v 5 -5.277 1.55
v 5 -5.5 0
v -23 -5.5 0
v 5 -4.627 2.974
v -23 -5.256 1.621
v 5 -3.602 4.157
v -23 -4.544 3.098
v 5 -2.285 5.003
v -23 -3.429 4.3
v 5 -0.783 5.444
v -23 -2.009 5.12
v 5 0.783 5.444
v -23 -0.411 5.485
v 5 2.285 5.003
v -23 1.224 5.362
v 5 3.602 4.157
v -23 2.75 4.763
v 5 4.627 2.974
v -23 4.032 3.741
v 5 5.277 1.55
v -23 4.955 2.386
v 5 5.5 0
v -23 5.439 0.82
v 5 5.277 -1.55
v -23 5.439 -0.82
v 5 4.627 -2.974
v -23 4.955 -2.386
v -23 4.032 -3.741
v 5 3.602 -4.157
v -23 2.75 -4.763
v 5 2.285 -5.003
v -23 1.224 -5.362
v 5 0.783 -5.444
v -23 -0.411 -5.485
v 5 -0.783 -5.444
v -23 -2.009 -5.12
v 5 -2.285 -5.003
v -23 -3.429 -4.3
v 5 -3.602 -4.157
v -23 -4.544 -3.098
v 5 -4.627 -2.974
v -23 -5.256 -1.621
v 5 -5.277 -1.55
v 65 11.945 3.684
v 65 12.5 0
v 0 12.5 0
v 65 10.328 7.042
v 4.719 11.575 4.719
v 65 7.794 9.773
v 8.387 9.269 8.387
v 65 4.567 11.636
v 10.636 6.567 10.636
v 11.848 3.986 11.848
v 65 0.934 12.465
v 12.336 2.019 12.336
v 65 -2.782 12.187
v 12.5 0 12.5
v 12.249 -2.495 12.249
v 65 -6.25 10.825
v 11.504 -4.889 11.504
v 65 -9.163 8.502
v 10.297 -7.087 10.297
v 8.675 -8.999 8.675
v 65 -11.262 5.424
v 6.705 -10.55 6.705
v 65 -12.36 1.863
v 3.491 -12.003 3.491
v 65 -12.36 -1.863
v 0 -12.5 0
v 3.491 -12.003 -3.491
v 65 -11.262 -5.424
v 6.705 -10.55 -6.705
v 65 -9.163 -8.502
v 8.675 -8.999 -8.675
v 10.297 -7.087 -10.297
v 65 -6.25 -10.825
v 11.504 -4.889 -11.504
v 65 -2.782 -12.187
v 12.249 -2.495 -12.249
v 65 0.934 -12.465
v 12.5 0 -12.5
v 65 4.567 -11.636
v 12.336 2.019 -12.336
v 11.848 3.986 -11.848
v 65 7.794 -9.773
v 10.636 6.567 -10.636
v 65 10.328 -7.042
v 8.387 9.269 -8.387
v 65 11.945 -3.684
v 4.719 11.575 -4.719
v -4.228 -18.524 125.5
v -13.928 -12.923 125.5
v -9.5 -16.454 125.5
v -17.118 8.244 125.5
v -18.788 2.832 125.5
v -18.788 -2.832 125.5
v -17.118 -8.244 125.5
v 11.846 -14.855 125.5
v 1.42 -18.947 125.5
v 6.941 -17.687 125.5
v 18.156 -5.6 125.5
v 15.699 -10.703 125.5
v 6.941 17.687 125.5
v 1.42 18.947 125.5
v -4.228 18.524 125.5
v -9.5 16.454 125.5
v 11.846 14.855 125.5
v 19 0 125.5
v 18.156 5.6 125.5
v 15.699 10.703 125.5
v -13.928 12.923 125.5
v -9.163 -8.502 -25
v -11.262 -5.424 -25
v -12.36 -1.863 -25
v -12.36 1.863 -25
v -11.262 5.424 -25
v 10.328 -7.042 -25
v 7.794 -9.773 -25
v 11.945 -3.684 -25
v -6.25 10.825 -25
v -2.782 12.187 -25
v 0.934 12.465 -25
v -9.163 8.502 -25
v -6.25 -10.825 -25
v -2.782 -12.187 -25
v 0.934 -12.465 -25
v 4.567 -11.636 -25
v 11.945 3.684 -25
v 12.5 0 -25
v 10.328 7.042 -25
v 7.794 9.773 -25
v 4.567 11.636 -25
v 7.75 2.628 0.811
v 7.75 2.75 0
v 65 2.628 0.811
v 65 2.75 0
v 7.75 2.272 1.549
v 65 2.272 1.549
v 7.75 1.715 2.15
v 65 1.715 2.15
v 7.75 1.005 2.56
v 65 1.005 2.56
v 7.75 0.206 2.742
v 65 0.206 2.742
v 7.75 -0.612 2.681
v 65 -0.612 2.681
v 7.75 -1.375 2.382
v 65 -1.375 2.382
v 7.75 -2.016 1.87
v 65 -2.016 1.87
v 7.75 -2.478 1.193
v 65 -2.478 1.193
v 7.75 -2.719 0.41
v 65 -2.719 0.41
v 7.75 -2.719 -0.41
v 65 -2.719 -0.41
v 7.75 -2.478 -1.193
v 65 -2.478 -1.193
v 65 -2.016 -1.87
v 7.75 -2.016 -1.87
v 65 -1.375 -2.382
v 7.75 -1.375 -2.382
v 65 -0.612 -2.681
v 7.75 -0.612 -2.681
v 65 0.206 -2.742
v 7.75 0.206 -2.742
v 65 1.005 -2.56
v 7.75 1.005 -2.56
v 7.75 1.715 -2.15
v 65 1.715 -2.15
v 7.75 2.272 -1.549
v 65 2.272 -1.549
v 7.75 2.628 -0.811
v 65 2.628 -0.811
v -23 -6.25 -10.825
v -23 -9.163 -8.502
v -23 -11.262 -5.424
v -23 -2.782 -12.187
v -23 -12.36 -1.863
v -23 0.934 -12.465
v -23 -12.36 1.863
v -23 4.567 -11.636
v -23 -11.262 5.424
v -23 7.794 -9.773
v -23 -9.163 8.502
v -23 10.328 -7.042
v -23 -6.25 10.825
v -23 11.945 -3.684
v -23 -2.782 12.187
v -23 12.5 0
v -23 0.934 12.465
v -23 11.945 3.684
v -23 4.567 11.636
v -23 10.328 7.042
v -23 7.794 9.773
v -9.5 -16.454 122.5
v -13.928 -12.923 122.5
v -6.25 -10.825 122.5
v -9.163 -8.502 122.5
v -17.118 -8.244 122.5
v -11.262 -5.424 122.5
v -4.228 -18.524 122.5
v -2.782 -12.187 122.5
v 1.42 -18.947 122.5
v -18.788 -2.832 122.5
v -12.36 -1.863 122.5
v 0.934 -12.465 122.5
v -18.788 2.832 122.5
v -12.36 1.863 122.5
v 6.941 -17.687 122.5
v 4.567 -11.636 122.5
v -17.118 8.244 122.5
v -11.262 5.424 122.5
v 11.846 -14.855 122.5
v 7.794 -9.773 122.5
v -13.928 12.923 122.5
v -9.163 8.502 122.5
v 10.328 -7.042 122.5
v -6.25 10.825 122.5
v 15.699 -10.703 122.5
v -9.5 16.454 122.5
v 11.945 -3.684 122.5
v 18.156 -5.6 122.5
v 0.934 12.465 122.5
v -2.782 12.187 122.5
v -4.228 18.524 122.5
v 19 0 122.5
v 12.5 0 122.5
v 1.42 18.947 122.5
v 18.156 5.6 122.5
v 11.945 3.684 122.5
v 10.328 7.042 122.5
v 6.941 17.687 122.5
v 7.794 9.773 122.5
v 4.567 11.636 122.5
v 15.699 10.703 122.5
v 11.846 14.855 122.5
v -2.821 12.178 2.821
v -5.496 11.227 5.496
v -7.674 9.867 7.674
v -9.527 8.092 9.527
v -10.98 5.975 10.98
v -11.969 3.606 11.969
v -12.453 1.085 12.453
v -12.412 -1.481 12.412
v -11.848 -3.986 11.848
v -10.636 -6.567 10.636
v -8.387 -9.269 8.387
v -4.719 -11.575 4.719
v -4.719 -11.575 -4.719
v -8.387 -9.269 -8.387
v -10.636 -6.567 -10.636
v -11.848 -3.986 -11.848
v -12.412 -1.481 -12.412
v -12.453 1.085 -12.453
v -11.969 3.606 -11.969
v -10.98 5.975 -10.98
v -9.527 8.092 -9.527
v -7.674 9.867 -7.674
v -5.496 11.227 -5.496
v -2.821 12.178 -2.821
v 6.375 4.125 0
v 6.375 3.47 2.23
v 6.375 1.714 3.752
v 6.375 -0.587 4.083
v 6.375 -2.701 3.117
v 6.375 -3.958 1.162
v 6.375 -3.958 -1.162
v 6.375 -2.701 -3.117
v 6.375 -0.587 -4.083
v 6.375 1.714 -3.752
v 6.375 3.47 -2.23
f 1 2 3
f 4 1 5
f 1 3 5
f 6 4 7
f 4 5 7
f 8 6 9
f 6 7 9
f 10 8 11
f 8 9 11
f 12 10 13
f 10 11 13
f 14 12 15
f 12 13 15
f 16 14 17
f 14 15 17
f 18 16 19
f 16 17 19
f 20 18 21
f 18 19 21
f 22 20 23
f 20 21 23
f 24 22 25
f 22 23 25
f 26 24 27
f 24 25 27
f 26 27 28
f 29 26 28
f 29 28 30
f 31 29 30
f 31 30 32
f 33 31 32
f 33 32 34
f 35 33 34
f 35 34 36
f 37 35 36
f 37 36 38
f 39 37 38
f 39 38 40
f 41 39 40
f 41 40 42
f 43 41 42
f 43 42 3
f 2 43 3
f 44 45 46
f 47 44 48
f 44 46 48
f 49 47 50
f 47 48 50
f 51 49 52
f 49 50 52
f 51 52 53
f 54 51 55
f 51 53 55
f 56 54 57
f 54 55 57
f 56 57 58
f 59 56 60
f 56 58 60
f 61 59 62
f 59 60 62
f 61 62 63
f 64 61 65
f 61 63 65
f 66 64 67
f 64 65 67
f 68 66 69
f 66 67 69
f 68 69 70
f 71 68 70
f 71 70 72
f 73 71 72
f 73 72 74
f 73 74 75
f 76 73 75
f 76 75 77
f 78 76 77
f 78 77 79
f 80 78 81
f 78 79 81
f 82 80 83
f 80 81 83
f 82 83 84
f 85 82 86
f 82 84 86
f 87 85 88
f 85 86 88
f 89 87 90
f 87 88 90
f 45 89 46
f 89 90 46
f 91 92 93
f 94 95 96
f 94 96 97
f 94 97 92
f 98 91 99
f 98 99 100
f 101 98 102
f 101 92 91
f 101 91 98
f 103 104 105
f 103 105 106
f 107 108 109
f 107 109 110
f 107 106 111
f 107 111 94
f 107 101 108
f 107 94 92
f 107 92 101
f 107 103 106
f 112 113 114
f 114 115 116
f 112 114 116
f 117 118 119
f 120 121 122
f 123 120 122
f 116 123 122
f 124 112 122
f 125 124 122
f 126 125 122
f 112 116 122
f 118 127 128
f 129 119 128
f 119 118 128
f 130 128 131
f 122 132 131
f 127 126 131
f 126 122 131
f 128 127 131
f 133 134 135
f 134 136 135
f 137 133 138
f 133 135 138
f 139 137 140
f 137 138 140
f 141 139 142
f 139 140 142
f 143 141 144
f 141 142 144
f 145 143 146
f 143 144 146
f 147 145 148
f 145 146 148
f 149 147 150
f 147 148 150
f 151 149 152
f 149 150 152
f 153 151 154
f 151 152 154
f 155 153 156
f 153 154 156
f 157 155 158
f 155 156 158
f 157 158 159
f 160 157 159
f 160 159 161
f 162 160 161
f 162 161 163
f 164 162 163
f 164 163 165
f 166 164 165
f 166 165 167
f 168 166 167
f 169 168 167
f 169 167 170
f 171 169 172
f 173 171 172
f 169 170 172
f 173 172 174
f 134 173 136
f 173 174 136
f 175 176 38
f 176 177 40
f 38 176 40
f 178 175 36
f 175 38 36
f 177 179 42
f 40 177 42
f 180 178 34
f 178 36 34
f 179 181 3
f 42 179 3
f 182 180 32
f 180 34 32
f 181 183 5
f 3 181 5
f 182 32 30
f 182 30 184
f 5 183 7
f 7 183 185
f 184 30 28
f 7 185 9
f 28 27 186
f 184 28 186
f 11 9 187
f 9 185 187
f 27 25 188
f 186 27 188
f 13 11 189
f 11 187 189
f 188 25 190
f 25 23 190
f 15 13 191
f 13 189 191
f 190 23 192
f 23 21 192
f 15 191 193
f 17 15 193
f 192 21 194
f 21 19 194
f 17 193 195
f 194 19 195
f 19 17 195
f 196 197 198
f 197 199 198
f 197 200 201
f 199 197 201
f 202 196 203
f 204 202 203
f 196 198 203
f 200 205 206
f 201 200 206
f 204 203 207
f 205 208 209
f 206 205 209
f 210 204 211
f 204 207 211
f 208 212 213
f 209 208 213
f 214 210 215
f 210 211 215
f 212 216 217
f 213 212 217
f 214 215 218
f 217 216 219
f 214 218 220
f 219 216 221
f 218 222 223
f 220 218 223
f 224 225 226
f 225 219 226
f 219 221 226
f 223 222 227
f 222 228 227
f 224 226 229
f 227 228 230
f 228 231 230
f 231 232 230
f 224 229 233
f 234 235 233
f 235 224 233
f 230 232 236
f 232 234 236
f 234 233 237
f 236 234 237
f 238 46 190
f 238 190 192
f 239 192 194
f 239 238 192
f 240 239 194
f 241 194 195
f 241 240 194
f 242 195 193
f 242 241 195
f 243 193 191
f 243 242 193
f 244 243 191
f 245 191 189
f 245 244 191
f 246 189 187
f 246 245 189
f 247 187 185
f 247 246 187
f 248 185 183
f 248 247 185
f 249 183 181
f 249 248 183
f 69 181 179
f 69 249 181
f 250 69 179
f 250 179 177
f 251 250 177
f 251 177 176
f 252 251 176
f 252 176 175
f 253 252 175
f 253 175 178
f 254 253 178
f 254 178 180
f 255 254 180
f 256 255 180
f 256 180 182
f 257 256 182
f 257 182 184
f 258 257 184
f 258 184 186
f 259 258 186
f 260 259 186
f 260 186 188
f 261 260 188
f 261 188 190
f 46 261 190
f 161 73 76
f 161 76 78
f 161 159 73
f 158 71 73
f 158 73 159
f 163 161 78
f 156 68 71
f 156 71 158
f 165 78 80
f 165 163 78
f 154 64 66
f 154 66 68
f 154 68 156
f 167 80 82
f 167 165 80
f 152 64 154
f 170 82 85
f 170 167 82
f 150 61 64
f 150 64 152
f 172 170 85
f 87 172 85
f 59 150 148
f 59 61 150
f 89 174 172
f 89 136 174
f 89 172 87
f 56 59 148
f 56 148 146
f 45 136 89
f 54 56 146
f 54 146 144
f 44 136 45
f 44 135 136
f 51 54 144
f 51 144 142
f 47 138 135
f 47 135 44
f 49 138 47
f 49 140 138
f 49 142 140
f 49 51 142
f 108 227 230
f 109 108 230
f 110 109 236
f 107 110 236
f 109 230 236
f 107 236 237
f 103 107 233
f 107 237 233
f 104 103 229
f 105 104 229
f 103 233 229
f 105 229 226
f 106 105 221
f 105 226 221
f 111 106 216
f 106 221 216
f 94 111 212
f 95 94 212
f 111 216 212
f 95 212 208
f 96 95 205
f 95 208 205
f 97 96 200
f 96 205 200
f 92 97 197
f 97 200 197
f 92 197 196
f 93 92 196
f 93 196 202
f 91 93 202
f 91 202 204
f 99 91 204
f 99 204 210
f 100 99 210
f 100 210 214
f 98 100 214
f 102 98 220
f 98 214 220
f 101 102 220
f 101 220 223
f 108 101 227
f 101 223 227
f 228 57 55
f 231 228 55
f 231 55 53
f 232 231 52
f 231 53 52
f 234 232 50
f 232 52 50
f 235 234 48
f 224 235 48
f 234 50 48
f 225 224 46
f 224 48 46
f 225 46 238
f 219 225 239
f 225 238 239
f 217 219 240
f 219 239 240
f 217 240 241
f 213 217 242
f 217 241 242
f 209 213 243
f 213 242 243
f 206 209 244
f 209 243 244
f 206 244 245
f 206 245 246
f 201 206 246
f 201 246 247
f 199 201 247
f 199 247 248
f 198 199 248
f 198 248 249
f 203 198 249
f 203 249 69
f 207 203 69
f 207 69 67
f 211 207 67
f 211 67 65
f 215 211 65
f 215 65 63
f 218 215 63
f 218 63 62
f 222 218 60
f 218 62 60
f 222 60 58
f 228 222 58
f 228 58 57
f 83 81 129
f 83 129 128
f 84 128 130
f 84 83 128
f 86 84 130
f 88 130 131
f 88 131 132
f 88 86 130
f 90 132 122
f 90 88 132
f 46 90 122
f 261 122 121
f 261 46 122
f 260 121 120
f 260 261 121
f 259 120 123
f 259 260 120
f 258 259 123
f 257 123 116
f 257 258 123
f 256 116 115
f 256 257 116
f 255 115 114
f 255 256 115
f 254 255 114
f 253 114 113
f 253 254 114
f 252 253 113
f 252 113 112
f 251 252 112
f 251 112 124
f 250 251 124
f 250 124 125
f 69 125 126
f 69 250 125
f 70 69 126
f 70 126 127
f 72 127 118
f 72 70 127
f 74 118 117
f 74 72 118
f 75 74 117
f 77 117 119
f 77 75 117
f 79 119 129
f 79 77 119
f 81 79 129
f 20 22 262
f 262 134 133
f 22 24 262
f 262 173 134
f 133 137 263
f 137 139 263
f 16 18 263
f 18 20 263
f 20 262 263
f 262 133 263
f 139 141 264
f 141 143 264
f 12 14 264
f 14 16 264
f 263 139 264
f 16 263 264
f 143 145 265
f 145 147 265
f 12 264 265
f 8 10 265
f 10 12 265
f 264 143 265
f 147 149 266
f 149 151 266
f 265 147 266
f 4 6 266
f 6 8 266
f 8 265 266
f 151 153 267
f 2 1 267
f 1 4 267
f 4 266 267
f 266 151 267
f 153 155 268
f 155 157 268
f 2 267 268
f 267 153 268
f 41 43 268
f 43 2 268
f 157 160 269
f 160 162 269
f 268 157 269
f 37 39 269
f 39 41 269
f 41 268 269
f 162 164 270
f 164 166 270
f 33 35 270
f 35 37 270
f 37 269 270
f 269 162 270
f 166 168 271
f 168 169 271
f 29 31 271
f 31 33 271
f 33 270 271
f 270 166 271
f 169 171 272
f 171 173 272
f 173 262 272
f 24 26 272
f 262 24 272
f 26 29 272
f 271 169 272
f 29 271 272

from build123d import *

# Parameters (mm, degrees)
F0_R            = 12.5
F1_DEPTH        = 122.5
F2_R            = 12.5
F3_DEPTH        = 65
F4_DEPTH        = 23
F5_DEPTH        = 25
F6_R            = 19
F7_DEPTH        = 3
F8_R            = 5.5
F9_DEPTH        = 28
F11_D           = 5.5
F11_DEPTH       = 100
F11_CSINK_D     = 11
F11_CSINK_ANGLE = 90


with BuildPart() as f1:
    # F0 (on Top) → F1 (new body)
    with BuildSketch(Plane.XY):
        Circle(F0_R)
    extrude(amount=F1_DEPTH)

    # F2 (on Right) → F3 (join)
    with BuildSketch(Plane.YZ):
        Circle(F2_R)
    extrude(amount=F3_DEPTH)

    # F2 (on Right) → F4 (join)
    with BuildSketch(Plane.YZ):
        Circle(F2_R)
    extrude(amount=-F4_DEPTH)

    # F0 (on Top) → F5 (join)
    with BuildSketch(Plane.XY):
        Circle(F0_R)
    extrude(amount=-F5_DEPTH)

    # F6 (on face) → F7 (join)
    with BuildSketch(Plane.XY.offset(122.5)):
        Circle(F6_R)
    extrude(amount=F7_DEPTH)

    # F8 (on face) → F9 (cut)
    with BuildSketch(Plane(origin=(-23, 0, 0), x_dir=(0, -1, 0), z_dir=(-1, 0, 0))):
        Circle(F8_R)
    extrude(amount=-F9_DEPTH, mode=Mode.SUBTRACT)

    # F11
    with Locations(Plane(origin=(5, 0, 0), x_dir=(0, -1, 0), z_dir=(-1, 0, 0))):
        with Locations((0, 0)):
            CounterSinkHole(F11_D / 2, F11_CSINK_D / 2, depth=F11_DEPTH, counter_sink_angle=F11_CSINK_ANGLE)


solid = f1.part
